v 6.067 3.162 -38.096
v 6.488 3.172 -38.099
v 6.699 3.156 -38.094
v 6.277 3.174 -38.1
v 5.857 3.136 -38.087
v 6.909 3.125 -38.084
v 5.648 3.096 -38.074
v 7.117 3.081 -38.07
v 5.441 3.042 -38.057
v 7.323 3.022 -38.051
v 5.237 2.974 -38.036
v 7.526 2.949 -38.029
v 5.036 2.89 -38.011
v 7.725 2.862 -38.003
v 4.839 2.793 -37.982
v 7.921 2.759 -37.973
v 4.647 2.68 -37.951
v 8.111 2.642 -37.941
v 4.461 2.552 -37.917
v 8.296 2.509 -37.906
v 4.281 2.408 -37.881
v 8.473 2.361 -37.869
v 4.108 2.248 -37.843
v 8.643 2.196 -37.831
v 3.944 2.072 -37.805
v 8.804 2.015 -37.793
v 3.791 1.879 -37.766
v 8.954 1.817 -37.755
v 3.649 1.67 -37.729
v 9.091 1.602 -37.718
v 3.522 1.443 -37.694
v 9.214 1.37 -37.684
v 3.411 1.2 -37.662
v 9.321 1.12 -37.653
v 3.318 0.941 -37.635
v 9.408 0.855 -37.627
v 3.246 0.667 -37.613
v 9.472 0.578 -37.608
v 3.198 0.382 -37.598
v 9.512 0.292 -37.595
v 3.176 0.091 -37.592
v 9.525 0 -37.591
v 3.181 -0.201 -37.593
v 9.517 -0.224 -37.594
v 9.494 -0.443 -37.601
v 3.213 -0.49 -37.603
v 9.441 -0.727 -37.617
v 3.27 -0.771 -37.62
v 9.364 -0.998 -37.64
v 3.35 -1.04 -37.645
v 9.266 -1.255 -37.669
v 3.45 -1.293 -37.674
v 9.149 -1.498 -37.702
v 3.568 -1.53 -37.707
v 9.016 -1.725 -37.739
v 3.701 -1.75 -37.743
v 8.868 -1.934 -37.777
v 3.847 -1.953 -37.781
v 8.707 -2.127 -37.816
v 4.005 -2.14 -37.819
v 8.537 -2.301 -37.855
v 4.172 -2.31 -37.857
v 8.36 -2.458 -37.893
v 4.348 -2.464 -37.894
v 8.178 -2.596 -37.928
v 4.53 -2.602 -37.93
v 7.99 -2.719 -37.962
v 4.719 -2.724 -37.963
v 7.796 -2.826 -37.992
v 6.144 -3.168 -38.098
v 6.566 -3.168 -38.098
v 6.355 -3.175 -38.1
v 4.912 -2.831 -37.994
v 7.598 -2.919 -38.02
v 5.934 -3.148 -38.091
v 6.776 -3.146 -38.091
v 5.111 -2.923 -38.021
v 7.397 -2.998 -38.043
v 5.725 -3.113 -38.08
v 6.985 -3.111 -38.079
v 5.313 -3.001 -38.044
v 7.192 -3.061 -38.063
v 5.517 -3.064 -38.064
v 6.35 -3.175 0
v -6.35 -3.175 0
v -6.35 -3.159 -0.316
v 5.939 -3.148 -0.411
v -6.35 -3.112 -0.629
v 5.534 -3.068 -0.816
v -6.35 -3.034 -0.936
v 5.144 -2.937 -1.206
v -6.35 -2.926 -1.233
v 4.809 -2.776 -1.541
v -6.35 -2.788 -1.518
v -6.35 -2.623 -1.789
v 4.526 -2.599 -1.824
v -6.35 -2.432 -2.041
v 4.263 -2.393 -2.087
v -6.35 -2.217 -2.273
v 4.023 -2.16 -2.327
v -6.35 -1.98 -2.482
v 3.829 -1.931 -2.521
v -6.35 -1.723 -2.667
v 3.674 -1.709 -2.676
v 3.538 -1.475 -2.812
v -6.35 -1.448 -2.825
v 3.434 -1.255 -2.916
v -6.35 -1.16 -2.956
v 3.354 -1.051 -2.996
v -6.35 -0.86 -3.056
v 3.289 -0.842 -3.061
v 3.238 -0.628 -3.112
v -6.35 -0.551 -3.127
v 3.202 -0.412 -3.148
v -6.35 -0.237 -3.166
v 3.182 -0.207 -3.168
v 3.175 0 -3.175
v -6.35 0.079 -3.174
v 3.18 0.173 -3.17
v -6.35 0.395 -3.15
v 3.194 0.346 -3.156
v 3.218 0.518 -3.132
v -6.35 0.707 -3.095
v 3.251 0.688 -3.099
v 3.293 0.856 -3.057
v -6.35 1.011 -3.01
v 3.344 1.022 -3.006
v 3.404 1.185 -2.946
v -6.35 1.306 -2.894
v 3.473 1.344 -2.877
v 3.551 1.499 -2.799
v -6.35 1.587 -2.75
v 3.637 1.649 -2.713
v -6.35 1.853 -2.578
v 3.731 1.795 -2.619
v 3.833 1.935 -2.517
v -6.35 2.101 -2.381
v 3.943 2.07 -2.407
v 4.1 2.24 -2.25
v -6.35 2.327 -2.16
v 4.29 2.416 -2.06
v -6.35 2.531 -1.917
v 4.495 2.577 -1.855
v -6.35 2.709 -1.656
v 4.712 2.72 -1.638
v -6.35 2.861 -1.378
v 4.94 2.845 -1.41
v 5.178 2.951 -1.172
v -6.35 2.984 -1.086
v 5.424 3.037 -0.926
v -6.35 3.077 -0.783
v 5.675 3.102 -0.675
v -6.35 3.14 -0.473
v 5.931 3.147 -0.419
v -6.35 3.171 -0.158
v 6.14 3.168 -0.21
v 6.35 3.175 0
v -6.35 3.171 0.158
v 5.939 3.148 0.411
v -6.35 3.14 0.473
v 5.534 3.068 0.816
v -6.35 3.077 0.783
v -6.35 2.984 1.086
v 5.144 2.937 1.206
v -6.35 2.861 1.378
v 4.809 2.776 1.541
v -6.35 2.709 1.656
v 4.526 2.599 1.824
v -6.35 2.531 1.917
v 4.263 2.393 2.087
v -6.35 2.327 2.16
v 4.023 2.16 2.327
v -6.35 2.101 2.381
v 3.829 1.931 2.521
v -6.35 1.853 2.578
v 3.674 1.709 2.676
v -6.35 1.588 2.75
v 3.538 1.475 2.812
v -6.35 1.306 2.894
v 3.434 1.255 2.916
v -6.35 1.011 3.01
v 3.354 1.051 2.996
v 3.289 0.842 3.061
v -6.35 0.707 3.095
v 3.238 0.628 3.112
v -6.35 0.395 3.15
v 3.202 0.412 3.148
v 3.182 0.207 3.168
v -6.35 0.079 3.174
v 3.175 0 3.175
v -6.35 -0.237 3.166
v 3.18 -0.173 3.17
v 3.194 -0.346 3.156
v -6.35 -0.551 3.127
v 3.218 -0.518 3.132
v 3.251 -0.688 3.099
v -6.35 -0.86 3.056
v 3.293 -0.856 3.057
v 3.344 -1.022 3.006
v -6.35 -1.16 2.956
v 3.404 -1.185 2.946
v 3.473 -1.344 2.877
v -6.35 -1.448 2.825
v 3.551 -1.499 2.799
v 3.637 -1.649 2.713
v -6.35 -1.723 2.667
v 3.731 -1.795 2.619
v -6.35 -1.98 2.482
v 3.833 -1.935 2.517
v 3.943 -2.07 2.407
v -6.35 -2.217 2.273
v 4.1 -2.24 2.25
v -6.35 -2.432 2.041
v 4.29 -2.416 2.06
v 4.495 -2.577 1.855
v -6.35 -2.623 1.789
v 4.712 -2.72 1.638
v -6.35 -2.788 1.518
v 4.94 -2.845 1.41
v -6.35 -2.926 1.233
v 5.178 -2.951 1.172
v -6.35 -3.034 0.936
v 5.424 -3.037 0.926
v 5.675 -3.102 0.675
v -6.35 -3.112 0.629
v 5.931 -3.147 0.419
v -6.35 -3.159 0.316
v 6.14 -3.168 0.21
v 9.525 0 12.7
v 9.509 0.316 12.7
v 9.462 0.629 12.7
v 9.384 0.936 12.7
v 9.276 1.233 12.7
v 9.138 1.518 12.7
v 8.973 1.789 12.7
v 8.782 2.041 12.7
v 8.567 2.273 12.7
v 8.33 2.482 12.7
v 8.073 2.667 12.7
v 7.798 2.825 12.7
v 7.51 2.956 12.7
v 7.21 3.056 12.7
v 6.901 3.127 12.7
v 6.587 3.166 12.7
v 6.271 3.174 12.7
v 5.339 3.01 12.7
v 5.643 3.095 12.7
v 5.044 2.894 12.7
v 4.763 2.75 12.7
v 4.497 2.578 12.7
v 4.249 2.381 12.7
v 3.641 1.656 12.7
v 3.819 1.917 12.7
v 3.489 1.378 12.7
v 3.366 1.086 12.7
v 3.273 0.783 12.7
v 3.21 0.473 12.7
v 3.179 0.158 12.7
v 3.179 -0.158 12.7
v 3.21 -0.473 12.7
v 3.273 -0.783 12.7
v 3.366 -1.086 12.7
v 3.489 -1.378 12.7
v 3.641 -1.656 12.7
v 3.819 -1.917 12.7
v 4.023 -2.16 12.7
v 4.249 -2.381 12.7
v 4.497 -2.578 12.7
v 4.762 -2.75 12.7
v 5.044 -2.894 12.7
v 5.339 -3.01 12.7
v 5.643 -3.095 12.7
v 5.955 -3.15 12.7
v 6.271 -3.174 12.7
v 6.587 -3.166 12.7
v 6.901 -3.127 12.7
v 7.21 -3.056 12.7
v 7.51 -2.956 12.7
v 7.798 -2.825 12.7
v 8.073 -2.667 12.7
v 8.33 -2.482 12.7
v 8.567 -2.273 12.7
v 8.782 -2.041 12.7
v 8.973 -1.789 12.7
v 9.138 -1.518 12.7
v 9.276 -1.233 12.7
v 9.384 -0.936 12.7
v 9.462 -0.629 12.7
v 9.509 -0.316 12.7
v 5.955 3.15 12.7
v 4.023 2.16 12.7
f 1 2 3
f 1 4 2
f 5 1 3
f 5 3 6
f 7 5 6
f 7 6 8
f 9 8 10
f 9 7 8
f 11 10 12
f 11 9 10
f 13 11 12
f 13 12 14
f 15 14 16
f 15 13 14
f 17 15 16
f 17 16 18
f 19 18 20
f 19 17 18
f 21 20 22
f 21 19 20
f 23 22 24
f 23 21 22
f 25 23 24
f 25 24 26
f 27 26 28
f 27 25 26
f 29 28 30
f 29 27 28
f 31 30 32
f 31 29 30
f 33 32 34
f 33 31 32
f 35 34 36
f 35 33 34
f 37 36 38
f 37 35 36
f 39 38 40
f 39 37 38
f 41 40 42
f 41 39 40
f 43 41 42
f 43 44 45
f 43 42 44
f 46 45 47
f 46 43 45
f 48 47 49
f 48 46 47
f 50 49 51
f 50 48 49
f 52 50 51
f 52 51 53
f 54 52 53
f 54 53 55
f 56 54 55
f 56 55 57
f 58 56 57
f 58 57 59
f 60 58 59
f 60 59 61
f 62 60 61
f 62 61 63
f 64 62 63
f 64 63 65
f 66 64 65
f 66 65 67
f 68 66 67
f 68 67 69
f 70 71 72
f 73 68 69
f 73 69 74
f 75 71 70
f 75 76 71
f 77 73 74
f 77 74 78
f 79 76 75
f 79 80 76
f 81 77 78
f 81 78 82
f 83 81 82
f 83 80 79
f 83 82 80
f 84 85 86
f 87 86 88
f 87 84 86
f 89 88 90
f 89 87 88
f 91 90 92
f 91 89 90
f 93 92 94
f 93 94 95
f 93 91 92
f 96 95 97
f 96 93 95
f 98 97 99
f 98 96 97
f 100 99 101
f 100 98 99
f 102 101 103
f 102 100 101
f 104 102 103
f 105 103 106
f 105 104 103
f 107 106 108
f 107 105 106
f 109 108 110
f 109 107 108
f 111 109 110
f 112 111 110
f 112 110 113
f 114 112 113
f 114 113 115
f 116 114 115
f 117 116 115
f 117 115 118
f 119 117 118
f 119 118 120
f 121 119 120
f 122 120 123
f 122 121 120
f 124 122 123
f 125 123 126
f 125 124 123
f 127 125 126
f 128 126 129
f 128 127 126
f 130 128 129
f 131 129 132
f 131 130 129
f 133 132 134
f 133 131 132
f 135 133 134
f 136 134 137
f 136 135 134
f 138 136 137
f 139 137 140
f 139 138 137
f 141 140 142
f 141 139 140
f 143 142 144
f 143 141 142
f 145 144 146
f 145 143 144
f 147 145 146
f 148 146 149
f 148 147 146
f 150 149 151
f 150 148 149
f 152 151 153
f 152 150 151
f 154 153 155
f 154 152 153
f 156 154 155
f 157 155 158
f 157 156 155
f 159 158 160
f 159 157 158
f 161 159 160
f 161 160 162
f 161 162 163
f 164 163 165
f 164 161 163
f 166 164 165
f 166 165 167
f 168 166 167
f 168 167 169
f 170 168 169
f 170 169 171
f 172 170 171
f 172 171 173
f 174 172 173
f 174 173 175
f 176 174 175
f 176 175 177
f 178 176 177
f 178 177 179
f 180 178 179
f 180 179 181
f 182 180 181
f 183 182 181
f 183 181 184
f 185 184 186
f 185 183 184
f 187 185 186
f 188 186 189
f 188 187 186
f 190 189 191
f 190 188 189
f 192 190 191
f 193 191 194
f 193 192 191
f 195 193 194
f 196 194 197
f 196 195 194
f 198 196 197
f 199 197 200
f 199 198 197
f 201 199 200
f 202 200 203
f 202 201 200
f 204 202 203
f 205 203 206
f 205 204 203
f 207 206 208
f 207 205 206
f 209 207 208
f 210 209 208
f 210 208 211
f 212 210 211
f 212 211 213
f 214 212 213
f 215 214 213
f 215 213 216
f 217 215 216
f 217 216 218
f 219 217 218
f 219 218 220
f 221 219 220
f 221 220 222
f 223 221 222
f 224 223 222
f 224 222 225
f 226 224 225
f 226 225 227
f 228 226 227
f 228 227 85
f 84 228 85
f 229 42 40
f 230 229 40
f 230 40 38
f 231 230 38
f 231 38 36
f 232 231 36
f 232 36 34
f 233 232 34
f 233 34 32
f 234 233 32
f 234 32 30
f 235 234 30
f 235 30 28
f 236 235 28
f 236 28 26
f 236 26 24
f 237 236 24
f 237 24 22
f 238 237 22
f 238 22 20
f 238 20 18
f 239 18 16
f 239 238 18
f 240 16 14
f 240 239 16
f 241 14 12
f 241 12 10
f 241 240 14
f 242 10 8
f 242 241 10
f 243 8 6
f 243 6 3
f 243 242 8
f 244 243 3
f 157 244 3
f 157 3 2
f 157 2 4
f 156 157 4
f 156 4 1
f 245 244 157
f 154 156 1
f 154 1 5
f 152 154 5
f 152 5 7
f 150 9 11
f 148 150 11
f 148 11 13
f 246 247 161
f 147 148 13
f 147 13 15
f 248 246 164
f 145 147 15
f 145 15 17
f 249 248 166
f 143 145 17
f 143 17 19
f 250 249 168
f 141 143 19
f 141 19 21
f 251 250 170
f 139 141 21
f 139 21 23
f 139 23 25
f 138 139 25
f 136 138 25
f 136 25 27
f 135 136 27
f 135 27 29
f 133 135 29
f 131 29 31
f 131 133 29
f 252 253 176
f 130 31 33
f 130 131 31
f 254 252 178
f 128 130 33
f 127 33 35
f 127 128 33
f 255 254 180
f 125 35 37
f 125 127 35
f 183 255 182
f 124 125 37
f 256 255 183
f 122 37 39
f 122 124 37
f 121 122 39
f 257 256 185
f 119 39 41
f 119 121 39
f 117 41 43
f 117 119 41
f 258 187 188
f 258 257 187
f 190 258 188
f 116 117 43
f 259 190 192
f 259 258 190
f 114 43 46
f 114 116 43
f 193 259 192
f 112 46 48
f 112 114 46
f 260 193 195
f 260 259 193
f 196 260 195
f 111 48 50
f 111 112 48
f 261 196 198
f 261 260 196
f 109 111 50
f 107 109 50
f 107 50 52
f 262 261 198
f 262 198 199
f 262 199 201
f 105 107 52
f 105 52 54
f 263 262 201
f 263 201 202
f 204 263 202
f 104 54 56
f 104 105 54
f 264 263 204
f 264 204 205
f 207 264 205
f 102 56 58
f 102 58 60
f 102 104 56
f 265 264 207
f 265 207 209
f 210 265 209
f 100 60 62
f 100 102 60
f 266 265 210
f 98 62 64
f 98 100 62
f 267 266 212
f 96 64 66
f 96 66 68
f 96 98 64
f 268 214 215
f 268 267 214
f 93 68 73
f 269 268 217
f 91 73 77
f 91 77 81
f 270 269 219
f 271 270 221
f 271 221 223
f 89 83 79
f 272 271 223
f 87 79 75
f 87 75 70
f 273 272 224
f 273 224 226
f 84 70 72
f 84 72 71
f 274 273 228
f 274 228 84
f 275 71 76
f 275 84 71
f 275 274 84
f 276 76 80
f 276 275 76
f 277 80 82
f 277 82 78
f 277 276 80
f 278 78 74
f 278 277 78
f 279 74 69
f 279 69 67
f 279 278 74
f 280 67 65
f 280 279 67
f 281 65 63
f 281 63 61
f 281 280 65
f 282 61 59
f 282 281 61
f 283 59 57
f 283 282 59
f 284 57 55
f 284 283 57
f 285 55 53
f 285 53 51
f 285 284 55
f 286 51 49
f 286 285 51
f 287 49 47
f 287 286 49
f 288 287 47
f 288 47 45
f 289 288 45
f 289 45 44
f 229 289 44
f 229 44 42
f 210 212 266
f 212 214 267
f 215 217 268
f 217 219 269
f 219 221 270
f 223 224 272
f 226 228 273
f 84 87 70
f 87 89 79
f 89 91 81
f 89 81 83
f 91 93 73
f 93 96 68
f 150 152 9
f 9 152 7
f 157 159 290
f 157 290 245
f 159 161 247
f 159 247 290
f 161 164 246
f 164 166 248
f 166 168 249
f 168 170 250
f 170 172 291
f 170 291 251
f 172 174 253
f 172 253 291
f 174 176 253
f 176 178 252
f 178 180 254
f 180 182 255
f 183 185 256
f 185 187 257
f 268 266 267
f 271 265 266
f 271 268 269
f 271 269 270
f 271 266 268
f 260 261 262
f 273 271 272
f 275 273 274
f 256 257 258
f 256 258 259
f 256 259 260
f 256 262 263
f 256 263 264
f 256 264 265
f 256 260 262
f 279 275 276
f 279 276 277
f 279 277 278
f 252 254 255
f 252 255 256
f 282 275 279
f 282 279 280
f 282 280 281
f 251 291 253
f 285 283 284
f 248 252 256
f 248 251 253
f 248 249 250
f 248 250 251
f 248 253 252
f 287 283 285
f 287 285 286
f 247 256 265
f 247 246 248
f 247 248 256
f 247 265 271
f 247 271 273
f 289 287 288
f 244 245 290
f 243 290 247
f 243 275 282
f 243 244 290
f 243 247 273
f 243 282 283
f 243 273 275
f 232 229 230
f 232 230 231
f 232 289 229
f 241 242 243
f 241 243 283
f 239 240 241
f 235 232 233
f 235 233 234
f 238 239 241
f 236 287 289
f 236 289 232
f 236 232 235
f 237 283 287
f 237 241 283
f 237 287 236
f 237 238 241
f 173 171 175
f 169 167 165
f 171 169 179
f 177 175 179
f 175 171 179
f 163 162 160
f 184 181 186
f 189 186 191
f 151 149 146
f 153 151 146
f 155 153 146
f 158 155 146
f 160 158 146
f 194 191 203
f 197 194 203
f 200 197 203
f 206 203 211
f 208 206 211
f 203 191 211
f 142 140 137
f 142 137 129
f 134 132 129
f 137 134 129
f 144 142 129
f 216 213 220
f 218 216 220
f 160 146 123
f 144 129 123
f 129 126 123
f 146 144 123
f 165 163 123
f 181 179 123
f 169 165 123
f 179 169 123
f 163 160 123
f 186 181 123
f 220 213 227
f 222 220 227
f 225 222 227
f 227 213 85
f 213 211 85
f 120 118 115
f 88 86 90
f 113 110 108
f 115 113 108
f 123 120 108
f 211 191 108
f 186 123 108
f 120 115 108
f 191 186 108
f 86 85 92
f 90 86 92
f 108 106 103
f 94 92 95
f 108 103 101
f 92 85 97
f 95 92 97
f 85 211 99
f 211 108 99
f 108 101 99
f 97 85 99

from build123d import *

# Parameters (mm, degrees)
F0_W     = 12.7
F0_H     = 3.175
F2_R     = 3.175
F3_DEPTH = 3.175
F5_R     = 3.175
F6_DEPTH = 50.8
F7_R     = 10.16
F8_DEPTH = 25.4


with BuildPart() as f1:
    # F0 (on Top) → F1 (revolve)
    with BuildSketch(Plane.XY):
        with Locations((0, -1.5875)):
            Rectangle(F0_W, F0_H)
    revolve(axis=Axis((2.249268, 0, 0), (1, 0, 0)))

    # F2 (on Top) → F3 (cut, symmetric)
    with BuildSketch(Plane.XY):
        with Locations((6.35, 0)):
            Circle(F2_R)
    extrude(amount=F3_DEPTH, both=True, mode=Mode.SUBTRACT)

    # F5 (on offset) → F6 (join)
    with BuildSketch(Plane.XY.offset(12.7)):
        with Locations((6.35, 0)):
            Circle(F5_R)
    extrude(amount=-F6_DEPTH)

    # F7 (on Right) → F8 (cut)
    with BuildSketch(Plane.YZ):
        with Locations((0, -47.751164)):
            Circle(F7_R)
    extrude(amount=F8_DEPTH, mode=Mode.SUBTRACT)


solid = f1.part
